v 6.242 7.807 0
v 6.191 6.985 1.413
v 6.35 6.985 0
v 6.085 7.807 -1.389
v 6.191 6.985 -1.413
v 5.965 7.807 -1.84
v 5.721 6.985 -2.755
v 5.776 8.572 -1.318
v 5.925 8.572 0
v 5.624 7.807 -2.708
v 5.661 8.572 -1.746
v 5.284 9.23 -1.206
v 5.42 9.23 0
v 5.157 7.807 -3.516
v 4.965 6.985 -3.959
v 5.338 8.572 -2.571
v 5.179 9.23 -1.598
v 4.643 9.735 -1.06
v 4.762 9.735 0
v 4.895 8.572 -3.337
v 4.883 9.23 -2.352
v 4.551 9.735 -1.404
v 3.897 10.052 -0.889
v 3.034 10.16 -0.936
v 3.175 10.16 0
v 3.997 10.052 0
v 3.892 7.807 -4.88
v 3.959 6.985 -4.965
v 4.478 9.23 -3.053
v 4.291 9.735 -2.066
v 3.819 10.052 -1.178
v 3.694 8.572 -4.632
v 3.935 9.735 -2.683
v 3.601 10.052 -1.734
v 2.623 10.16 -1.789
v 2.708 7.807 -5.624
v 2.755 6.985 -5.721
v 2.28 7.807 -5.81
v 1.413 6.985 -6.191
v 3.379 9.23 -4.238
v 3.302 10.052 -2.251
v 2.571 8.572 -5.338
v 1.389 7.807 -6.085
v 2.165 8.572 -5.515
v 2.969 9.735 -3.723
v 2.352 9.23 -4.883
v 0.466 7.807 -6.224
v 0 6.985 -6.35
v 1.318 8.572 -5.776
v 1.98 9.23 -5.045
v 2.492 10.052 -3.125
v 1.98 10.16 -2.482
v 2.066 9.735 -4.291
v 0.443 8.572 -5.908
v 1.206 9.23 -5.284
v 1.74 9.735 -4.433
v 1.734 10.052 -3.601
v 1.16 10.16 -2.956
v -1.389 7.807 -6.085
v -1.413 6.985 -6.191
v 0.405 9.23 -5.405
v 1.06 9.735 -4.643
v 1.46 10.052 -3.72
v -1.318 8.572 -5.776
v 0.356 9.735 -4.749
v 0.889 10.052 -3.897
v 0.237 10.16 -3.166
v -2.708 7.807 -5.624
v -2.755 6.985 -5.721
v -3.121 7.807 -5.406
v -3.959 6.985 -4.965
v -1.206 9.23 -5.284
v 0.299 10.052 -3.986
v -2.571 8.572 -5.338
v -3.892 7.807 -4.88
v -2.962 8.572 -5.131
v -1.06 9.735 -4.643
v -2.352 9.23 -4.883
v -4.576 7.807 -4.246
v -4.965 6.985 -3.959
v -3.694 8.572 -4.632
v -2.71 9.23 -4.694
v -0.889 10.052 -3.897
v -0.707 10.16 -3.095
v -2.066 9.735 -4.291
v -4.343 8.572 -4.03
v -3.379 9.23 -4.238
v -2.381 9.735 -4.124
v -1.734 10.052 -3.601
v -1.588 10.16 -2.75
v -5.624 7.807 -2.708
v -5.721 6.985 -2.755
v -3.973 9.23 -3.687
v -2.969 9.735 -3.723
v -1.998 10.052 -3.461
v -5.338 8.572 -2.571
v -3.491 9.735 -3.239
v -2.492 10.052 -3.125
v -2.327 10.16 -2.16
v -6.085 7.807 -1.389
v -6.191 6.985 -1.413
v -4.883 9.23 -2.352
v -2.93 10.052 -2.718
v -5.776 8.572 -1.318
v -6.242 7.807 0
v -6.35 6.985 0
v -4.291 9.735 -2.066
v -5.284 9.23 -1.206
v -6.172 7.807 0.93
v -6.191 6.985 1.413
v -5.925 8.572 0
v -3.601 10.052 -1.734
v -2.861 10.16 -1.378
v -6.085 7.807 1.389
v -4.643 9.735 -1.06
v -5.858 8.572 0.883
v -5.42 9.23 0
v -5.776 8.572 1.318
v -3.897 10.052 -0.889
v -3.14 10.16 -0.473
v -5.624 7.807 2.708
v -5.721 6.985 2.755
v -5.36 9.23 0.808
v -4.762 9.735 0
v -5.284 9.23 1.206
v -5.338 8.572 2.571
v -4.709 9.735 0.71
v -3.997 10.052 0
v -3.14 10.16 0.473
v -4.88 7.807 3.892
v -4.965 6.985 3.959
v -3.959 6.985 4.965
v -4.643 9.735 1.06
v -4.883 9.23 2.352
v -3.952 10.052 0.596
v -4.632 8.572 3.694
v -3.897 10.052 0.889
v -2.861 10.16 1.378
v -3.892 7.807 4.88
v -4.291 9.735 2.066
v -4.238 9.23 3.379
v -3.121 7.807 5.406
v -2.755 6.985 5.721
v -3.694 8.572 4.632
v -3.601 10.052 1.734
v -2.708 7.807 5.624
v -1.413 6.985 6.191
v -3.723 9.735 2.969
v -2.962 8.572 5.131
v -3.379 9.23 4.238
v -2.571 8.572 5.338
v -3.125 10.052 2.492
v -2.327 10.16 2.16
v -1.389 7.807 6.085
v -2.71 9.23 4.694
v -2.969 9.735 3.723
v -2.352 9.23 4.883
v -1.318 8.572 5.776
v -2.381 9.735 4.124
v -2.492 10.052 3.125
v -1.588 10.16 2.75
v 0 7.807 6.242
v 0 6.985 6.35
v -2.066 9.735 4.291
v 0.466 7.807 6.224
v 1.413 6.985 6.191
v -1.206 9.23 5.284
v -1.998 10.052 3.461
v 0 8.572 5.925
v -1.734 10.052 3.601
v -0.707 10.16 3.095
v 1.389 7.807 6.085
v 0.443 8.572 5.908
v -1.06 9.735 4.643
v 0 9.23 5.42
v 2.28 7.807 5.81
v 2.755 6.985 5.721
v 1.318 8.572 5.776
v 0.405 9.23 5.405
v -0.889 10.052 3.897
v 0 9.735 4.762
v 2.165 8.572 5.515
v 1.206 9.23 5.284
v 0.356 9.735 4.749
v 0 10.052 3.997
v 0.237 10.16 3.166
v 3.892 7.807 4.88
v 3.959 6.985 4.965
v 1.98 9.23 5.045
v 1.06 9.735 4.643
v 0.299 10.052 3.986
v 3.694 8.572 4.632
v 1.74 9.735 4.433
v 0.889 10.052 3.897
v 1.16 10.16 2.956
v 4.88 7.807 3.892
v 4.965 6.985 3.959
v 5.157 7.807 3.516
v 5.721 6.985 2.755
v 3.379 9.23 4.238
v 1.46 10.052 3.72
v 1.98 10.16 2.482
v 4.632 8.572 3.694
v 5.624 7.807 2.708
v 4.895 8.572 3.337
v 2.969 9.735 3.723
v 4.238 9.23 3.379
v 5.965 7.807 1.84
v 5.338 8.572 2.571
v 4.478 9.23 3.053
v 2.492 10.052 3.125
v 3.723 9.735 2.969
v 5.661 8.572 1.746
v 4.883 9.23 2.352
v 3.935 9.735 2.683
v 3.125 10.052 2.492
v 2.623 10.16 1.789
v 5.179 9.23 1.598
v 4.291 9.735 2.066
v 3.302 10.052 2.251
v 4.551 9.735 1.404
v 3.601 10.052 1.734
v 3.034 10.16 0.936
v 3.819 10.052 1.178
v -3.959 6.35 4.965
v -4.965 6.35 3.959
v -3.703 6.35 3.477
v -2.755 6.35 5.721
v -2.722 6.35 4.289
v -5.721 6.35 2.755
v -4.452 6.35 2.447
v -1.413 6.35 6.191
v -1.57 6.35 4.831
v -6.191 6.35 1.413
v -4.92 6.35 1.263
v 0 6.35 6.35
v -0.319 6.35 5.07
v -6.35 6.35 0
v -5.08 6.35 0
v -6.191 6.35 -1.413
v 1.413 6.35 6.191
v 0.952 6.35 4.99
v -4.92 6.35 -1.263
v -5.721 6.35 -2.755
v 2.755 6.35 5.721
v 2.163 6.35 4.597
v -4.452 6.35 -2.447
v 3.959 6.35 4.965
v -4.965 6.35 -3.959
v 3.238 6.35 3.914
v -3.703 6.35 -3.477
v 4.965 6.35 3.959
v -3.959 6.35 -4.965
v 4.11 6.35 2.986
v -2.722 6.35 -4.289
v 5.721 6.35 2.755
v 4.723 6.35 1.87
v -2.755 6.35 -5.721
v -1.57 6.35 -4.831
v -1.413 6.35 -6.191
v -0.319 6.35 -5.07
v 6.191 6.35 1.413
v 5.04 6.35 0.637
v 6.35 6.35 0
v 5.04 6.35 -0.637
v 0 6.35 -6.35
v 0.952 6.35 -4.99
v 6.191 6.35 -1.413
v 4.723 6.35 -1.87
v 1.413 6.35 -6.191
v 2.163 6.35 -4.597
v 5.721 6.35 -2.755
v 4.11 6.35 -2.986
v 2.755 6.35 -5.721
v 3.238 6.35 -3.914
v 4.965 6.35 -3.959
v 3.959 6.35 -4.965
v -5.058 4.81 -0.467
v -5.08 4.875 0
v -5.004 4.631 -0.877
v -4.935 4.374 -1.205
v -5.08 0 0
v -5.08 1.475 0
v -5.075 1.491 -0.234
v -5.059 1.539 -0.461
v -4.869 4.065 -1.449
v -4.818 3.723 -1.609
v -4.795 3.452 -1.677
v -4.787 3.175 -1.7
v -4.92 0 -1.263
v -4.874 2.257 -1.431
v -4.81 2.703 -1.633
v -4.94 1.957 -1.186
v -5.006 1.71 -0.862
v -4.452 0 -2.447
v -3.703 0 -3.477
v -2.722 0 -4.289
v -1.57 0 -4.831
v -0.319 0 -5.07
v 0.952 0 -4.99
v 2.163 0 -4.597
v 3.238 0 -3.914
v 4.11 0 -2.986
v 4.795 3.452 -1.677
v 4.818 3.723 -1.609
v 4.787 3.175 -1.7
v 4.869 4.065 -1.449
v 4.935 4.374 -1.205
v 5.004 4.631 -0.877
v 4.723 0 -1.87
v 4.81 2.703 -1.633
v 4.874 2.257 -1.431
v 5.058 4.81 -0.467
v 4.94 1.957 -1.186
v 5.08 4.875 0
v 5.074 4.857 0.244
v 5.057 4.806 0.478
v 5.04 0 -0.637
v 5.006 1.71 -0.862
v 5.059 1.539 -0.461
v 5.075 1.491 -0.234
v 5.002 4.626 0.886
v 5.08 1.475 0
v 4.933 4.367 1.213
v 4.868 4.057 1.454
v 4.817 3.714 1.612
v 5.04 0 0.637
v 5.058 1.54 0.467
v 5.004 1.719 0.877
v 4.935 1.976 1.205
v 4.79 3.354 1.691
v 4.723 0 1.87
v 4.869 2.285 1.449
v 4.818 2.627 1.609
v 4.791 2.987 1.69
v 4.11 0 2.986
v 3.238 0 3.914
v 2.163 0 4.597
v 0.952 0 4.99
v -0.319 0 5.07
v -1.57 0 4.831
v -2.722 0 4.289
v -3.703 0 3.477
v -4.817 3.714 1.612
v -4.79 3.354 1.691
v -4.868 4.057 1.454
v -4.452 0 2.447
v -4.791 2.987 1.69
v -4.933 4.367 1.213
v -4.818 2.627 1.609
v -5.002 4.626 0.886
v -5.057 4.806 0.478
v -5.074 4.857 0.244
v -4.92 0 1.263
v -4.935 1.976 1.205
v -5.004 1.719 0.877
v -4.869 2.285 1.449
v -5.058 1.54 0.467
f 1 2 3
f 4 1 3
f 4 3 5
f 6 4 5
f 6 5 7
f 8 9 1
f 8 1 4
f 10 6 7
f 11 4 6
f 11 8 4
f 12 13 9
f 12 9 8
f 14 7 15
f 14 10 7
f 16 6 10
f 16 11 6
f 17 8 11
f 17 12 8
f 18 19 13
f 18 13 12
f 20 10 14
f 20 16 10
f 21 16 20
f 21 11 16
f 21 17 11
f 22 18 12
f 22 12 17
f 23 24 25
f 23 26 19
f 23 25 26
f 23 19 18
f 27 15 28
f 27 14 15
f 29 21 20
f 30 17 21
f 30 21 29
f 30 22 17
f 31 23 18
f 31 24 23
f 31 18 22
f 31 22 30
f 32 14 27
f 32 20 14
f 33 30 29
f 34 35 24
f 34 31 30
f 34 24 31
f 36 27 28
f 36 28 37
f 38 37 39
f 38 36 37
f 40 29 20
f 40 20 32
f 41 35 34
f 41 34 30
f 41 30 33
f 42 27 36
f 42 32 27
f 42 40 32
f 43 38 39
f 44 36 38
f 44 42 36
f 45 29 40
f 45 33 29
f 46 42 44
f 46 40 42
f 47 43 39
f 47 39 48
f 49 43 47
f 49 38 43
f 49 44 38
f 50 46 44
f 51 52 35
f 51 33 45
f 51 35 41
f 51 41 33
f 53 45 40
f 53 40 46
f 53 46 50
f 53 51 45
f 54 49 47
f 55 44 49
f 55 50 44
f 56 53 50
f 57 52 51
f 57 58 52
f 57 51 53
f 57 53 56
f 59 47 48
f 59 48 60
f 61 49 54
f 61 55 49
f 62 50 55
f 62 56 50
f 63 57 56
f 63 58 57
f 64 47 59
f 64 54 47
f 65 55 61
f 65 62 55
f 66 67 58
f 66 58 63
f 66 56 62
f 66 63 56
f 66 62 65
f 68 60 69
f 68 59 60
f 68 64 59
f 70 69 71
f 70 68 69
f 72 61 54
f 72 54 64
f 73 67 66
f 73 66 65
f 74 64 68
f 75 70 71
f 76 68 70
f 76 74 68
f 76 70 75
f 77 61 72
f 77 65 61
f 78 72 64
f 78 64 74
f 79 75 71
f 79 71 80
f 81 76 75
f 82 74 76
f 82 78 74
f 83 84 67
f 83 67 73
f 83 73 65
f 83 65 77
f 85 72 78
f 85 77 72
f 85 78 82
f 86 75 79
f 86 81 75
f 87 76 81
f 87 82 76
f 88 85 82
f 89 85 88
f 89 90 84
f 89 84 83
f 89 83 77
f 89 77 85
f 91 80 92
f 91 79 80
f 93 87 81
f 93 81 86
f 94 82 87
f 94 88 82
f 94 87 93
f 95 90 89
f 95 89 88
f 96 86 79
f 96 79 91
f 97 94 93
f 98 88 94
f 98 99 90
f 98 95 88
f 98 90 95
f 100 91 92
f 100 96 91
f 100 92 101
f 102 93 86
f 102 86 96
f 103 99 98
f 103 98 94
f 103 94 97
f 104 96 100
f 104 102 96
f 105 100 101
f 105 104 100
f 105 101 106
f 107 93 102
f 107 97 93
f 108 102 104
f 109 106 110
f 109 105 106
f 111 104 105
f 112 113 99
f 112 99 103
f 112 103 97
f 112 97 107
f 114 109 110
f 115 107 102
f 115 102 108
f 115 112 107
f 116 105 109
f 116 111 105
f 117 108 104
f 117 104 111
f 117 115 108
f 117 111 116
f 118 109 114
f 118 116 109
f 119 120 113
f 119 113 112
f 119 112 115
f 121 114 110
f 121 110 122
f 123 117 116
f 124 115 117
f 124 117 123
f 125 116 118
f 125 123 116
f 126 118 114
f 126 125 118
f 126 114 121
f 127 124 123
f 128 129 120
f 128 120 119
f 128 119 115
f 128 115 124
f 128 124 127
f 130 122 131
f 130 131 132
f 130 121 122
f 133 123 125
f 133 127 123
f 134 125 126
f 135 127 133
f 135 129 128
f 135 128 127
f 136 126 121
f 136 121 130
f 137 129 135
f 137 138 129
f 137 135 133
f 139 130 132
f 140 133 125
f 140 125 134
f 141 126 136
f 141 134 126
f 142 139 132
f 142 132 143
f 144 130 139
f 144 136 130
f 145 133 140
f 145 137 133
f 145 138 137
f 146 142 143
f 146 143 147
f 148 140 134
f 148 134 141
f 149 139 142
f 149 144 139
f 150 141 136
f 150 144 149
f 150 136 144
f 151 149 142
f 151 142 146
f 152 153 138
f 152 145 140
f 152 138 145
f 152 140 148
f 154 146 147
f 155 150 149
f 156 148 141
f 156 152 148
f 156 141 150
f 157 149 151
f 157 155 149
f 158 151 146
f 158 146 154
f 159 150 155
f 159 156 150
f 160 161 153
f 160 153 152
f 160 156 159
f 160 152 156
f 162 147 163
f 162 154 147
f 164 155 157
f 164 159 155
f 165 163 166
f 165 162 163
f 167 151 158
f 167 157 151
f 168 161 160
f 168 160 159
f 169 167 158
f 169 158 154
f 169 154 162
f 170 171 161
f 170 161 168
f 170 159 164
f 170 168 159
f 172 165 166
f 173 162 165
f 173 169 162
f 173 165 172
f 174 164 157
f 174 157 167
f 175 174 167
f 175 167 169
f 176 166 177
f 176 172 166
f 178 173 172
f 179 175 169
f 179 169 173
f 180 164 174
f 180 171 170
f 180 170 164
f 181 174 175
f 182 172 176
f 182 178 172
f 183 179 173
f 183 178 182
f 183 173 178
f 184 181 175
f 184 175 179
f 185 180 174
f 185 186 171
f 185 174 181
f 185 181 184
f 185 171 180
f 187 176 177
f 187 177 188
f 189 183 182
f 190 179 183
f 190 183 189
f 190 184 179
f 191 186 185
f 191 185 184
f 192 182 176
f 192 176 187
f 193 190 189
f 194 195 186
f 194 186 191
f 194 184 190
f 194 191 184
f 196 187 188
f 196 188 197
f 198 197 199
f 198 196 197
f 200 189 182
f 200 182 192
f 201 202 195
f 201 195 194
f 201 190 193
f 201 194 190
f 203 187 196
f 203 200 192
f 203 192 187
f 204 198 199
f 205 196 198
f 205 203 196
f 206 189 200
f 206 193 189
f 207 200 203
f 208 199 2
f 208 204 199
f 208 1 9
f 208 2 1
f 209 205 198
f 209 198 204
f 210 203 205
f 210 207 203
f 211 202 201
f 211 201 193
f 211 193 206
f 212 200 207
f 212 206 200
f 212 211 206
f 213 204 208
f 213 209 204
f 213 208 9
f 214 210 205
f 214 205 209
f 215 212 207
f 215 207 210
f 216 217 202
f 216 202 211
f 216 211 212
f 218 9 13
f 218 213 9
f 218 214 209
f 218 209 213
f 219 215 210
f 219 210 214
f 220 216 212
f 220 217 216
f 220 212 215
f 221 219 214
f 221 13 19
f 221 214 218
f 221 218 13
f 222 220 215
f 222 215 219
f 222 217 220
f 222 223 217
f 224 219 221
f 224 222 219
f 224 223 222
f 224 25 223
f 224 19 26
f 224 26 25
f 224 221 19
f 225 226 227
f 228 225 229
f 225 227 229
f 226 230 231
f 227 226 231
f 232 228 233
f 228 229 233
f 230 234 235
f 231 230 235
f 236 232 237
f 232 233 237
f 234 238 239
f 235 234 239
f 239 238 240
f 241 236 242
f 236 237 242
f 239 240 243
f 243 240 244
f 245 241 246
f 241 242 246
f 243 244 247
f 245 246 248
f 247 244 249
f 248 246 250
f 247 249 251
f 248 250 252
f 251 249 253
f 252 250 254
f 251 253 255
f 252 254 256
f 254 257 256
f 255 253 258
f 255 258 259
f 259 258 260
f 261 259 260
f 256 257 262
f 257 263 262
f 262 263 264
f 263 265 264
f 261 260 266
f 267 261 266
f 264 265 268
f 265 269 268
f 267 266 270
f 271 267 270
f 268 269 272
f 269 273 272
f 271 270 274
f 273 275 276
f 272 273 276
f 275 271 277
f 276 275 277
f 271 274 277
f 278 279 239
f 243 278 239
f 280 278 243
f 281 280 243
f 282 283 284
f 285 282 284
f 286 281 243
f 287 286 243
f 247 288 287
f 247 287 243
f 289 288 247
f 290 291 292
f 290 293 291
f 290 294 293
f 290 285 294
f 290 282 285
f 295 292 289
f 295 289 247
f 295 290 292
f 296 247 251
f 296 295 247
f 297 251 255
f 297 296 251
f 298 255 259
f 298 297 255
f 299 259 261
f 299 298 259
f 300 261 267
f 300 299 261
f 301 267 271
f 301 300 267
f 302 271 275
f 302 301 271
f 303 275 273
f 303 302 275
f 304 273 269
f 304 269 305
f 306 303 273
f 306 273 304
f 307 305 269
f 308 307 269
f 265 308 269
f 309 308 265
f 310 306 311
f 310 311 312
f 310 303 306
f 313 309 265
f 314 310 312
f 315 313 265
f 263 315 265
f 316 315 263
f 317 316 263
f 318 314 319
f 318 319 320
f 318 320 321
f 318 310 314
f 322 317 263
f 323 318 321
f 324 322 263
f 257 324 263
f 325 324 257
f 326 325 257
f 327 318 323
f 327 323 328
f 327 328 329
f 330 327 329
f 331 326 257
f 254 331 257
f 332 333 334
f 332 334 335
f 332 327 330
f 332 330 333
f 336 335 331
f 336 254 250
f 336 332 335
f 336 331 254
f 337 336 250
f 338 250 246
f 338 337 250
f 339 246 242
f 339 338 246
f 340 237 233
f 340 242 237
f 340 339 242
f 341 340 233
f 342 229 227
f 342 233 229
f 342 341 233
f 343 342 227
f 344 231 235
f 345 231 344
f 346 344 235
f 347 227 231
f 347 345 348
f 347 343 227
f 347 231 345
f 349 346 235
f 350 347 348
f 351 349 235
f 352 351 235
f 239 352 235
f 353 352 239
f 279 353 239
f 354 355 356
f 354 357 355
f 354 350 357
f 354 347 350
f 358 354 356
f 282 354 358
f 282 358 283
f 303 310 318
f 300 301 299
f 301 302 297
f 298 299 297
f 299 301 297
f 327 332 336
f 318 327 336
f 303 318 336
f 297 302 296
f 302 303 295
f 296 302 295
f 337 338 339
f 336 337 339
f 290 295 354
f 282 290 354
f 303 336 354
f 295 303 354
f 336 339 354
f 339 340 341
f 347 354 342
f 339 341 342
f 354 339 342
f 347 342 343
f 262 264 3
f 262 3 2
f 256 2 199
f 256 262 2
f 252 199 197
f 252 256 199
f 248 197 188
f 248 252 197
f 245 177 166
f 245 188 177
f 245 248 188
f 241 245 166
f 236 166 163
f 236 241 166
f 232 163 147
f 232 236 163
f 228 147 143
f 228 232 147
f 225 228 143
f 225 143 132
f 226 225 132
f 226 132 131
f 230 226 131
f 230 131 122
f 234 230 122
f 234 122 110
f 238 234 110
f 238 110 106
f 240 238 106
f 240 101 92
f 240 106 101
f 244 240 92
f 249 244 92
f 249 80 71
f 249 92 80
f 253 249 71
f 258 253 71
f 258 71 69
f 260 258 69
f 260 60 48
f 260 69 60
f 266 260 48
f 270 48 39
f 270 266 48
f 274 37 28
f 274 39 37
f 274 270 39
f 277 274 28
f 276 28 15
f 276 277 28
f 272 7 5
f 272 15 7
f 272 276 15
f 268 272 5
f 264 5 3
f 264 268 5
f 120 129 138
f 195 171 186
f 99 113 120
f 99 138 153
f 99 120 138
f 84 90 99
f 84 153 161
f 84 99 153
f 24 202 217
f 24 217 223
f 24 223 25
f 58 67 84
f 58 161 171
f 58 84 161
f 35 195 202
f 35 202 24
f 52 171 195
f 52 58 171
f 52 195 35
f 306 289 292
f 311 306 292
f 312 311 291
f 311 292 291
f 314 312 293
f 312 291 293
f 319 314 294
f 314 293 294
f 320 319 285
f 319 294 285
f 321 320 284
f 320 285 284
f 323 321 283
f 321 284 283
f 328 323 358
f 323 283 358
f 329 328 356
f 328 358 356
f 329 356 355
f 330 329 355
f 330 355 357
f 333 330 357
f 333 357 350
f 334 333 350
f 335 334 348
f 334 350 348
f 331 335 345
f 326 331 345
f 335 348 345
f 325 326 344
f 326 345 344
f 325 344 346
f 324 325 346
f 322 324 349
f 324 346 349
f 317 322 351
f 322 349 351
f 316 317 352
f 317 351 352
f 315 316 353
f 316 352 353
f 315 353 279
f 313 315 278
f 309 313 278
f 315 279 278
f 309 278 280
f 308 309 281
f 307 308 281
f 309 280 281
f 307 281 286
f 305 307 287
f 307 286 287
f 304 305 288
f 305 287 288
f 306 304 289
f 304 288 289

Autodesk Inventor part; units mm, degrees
ref_plane "XZ Plane" through (0, 0, 0) normal (0, 1, 0) x (-1, 0, 0)
ref_plane "XY Plane" through (0, 0, 0) normal (0, 0, 1) x (1, 0, 0)
sketch "Sketch1" plane through (0, 0, 0) normal (0, 1, 0) x (-1, 0, 0)
  circle A0 centre (0, 0) radius 5.08
  dimension "d0" = 10.16
extrude "Extrusion1" add sketch "Sketch1" along normal blind 6.35
sketch "Sketch2" plane through (0, 6.35, 0) normal (0, 1, 0) x (1, 0, 0)
  circle A0 centre (0, 0) radius 6.35
  dimension "d3" = 12.7
extrude "Extrusion2" add sketch "Sketch2" along normal blind 3.81
fillet "Fillet1" radius 3.175 1 edges at (-6.35, 10.16, 0)
ref_plane "Work Plane1" through (5.08, 0, 0) normal (1, 0, 0) x (0, 1, 0)
sketch "Sketch3" plane through (5.08, 0, 0) normal (1, 0, 0) x (0, 1, 0)
  circle A0 centre (3.175, 0) radius 0.726
  point P0 (0, 0)
  dimension "d8" = 3.175
hole "Hole1" at (5.08, 3.175, 0) direction (-1, 0, 0) diameter 3.4 depth 25.4 tip angle 118 clearance for "Socket Head Cap Screw" size "M3" standard "Ansi Metric M Profile"
properties part number "Brass Endweight" material "Brass, Soft Yellow"
